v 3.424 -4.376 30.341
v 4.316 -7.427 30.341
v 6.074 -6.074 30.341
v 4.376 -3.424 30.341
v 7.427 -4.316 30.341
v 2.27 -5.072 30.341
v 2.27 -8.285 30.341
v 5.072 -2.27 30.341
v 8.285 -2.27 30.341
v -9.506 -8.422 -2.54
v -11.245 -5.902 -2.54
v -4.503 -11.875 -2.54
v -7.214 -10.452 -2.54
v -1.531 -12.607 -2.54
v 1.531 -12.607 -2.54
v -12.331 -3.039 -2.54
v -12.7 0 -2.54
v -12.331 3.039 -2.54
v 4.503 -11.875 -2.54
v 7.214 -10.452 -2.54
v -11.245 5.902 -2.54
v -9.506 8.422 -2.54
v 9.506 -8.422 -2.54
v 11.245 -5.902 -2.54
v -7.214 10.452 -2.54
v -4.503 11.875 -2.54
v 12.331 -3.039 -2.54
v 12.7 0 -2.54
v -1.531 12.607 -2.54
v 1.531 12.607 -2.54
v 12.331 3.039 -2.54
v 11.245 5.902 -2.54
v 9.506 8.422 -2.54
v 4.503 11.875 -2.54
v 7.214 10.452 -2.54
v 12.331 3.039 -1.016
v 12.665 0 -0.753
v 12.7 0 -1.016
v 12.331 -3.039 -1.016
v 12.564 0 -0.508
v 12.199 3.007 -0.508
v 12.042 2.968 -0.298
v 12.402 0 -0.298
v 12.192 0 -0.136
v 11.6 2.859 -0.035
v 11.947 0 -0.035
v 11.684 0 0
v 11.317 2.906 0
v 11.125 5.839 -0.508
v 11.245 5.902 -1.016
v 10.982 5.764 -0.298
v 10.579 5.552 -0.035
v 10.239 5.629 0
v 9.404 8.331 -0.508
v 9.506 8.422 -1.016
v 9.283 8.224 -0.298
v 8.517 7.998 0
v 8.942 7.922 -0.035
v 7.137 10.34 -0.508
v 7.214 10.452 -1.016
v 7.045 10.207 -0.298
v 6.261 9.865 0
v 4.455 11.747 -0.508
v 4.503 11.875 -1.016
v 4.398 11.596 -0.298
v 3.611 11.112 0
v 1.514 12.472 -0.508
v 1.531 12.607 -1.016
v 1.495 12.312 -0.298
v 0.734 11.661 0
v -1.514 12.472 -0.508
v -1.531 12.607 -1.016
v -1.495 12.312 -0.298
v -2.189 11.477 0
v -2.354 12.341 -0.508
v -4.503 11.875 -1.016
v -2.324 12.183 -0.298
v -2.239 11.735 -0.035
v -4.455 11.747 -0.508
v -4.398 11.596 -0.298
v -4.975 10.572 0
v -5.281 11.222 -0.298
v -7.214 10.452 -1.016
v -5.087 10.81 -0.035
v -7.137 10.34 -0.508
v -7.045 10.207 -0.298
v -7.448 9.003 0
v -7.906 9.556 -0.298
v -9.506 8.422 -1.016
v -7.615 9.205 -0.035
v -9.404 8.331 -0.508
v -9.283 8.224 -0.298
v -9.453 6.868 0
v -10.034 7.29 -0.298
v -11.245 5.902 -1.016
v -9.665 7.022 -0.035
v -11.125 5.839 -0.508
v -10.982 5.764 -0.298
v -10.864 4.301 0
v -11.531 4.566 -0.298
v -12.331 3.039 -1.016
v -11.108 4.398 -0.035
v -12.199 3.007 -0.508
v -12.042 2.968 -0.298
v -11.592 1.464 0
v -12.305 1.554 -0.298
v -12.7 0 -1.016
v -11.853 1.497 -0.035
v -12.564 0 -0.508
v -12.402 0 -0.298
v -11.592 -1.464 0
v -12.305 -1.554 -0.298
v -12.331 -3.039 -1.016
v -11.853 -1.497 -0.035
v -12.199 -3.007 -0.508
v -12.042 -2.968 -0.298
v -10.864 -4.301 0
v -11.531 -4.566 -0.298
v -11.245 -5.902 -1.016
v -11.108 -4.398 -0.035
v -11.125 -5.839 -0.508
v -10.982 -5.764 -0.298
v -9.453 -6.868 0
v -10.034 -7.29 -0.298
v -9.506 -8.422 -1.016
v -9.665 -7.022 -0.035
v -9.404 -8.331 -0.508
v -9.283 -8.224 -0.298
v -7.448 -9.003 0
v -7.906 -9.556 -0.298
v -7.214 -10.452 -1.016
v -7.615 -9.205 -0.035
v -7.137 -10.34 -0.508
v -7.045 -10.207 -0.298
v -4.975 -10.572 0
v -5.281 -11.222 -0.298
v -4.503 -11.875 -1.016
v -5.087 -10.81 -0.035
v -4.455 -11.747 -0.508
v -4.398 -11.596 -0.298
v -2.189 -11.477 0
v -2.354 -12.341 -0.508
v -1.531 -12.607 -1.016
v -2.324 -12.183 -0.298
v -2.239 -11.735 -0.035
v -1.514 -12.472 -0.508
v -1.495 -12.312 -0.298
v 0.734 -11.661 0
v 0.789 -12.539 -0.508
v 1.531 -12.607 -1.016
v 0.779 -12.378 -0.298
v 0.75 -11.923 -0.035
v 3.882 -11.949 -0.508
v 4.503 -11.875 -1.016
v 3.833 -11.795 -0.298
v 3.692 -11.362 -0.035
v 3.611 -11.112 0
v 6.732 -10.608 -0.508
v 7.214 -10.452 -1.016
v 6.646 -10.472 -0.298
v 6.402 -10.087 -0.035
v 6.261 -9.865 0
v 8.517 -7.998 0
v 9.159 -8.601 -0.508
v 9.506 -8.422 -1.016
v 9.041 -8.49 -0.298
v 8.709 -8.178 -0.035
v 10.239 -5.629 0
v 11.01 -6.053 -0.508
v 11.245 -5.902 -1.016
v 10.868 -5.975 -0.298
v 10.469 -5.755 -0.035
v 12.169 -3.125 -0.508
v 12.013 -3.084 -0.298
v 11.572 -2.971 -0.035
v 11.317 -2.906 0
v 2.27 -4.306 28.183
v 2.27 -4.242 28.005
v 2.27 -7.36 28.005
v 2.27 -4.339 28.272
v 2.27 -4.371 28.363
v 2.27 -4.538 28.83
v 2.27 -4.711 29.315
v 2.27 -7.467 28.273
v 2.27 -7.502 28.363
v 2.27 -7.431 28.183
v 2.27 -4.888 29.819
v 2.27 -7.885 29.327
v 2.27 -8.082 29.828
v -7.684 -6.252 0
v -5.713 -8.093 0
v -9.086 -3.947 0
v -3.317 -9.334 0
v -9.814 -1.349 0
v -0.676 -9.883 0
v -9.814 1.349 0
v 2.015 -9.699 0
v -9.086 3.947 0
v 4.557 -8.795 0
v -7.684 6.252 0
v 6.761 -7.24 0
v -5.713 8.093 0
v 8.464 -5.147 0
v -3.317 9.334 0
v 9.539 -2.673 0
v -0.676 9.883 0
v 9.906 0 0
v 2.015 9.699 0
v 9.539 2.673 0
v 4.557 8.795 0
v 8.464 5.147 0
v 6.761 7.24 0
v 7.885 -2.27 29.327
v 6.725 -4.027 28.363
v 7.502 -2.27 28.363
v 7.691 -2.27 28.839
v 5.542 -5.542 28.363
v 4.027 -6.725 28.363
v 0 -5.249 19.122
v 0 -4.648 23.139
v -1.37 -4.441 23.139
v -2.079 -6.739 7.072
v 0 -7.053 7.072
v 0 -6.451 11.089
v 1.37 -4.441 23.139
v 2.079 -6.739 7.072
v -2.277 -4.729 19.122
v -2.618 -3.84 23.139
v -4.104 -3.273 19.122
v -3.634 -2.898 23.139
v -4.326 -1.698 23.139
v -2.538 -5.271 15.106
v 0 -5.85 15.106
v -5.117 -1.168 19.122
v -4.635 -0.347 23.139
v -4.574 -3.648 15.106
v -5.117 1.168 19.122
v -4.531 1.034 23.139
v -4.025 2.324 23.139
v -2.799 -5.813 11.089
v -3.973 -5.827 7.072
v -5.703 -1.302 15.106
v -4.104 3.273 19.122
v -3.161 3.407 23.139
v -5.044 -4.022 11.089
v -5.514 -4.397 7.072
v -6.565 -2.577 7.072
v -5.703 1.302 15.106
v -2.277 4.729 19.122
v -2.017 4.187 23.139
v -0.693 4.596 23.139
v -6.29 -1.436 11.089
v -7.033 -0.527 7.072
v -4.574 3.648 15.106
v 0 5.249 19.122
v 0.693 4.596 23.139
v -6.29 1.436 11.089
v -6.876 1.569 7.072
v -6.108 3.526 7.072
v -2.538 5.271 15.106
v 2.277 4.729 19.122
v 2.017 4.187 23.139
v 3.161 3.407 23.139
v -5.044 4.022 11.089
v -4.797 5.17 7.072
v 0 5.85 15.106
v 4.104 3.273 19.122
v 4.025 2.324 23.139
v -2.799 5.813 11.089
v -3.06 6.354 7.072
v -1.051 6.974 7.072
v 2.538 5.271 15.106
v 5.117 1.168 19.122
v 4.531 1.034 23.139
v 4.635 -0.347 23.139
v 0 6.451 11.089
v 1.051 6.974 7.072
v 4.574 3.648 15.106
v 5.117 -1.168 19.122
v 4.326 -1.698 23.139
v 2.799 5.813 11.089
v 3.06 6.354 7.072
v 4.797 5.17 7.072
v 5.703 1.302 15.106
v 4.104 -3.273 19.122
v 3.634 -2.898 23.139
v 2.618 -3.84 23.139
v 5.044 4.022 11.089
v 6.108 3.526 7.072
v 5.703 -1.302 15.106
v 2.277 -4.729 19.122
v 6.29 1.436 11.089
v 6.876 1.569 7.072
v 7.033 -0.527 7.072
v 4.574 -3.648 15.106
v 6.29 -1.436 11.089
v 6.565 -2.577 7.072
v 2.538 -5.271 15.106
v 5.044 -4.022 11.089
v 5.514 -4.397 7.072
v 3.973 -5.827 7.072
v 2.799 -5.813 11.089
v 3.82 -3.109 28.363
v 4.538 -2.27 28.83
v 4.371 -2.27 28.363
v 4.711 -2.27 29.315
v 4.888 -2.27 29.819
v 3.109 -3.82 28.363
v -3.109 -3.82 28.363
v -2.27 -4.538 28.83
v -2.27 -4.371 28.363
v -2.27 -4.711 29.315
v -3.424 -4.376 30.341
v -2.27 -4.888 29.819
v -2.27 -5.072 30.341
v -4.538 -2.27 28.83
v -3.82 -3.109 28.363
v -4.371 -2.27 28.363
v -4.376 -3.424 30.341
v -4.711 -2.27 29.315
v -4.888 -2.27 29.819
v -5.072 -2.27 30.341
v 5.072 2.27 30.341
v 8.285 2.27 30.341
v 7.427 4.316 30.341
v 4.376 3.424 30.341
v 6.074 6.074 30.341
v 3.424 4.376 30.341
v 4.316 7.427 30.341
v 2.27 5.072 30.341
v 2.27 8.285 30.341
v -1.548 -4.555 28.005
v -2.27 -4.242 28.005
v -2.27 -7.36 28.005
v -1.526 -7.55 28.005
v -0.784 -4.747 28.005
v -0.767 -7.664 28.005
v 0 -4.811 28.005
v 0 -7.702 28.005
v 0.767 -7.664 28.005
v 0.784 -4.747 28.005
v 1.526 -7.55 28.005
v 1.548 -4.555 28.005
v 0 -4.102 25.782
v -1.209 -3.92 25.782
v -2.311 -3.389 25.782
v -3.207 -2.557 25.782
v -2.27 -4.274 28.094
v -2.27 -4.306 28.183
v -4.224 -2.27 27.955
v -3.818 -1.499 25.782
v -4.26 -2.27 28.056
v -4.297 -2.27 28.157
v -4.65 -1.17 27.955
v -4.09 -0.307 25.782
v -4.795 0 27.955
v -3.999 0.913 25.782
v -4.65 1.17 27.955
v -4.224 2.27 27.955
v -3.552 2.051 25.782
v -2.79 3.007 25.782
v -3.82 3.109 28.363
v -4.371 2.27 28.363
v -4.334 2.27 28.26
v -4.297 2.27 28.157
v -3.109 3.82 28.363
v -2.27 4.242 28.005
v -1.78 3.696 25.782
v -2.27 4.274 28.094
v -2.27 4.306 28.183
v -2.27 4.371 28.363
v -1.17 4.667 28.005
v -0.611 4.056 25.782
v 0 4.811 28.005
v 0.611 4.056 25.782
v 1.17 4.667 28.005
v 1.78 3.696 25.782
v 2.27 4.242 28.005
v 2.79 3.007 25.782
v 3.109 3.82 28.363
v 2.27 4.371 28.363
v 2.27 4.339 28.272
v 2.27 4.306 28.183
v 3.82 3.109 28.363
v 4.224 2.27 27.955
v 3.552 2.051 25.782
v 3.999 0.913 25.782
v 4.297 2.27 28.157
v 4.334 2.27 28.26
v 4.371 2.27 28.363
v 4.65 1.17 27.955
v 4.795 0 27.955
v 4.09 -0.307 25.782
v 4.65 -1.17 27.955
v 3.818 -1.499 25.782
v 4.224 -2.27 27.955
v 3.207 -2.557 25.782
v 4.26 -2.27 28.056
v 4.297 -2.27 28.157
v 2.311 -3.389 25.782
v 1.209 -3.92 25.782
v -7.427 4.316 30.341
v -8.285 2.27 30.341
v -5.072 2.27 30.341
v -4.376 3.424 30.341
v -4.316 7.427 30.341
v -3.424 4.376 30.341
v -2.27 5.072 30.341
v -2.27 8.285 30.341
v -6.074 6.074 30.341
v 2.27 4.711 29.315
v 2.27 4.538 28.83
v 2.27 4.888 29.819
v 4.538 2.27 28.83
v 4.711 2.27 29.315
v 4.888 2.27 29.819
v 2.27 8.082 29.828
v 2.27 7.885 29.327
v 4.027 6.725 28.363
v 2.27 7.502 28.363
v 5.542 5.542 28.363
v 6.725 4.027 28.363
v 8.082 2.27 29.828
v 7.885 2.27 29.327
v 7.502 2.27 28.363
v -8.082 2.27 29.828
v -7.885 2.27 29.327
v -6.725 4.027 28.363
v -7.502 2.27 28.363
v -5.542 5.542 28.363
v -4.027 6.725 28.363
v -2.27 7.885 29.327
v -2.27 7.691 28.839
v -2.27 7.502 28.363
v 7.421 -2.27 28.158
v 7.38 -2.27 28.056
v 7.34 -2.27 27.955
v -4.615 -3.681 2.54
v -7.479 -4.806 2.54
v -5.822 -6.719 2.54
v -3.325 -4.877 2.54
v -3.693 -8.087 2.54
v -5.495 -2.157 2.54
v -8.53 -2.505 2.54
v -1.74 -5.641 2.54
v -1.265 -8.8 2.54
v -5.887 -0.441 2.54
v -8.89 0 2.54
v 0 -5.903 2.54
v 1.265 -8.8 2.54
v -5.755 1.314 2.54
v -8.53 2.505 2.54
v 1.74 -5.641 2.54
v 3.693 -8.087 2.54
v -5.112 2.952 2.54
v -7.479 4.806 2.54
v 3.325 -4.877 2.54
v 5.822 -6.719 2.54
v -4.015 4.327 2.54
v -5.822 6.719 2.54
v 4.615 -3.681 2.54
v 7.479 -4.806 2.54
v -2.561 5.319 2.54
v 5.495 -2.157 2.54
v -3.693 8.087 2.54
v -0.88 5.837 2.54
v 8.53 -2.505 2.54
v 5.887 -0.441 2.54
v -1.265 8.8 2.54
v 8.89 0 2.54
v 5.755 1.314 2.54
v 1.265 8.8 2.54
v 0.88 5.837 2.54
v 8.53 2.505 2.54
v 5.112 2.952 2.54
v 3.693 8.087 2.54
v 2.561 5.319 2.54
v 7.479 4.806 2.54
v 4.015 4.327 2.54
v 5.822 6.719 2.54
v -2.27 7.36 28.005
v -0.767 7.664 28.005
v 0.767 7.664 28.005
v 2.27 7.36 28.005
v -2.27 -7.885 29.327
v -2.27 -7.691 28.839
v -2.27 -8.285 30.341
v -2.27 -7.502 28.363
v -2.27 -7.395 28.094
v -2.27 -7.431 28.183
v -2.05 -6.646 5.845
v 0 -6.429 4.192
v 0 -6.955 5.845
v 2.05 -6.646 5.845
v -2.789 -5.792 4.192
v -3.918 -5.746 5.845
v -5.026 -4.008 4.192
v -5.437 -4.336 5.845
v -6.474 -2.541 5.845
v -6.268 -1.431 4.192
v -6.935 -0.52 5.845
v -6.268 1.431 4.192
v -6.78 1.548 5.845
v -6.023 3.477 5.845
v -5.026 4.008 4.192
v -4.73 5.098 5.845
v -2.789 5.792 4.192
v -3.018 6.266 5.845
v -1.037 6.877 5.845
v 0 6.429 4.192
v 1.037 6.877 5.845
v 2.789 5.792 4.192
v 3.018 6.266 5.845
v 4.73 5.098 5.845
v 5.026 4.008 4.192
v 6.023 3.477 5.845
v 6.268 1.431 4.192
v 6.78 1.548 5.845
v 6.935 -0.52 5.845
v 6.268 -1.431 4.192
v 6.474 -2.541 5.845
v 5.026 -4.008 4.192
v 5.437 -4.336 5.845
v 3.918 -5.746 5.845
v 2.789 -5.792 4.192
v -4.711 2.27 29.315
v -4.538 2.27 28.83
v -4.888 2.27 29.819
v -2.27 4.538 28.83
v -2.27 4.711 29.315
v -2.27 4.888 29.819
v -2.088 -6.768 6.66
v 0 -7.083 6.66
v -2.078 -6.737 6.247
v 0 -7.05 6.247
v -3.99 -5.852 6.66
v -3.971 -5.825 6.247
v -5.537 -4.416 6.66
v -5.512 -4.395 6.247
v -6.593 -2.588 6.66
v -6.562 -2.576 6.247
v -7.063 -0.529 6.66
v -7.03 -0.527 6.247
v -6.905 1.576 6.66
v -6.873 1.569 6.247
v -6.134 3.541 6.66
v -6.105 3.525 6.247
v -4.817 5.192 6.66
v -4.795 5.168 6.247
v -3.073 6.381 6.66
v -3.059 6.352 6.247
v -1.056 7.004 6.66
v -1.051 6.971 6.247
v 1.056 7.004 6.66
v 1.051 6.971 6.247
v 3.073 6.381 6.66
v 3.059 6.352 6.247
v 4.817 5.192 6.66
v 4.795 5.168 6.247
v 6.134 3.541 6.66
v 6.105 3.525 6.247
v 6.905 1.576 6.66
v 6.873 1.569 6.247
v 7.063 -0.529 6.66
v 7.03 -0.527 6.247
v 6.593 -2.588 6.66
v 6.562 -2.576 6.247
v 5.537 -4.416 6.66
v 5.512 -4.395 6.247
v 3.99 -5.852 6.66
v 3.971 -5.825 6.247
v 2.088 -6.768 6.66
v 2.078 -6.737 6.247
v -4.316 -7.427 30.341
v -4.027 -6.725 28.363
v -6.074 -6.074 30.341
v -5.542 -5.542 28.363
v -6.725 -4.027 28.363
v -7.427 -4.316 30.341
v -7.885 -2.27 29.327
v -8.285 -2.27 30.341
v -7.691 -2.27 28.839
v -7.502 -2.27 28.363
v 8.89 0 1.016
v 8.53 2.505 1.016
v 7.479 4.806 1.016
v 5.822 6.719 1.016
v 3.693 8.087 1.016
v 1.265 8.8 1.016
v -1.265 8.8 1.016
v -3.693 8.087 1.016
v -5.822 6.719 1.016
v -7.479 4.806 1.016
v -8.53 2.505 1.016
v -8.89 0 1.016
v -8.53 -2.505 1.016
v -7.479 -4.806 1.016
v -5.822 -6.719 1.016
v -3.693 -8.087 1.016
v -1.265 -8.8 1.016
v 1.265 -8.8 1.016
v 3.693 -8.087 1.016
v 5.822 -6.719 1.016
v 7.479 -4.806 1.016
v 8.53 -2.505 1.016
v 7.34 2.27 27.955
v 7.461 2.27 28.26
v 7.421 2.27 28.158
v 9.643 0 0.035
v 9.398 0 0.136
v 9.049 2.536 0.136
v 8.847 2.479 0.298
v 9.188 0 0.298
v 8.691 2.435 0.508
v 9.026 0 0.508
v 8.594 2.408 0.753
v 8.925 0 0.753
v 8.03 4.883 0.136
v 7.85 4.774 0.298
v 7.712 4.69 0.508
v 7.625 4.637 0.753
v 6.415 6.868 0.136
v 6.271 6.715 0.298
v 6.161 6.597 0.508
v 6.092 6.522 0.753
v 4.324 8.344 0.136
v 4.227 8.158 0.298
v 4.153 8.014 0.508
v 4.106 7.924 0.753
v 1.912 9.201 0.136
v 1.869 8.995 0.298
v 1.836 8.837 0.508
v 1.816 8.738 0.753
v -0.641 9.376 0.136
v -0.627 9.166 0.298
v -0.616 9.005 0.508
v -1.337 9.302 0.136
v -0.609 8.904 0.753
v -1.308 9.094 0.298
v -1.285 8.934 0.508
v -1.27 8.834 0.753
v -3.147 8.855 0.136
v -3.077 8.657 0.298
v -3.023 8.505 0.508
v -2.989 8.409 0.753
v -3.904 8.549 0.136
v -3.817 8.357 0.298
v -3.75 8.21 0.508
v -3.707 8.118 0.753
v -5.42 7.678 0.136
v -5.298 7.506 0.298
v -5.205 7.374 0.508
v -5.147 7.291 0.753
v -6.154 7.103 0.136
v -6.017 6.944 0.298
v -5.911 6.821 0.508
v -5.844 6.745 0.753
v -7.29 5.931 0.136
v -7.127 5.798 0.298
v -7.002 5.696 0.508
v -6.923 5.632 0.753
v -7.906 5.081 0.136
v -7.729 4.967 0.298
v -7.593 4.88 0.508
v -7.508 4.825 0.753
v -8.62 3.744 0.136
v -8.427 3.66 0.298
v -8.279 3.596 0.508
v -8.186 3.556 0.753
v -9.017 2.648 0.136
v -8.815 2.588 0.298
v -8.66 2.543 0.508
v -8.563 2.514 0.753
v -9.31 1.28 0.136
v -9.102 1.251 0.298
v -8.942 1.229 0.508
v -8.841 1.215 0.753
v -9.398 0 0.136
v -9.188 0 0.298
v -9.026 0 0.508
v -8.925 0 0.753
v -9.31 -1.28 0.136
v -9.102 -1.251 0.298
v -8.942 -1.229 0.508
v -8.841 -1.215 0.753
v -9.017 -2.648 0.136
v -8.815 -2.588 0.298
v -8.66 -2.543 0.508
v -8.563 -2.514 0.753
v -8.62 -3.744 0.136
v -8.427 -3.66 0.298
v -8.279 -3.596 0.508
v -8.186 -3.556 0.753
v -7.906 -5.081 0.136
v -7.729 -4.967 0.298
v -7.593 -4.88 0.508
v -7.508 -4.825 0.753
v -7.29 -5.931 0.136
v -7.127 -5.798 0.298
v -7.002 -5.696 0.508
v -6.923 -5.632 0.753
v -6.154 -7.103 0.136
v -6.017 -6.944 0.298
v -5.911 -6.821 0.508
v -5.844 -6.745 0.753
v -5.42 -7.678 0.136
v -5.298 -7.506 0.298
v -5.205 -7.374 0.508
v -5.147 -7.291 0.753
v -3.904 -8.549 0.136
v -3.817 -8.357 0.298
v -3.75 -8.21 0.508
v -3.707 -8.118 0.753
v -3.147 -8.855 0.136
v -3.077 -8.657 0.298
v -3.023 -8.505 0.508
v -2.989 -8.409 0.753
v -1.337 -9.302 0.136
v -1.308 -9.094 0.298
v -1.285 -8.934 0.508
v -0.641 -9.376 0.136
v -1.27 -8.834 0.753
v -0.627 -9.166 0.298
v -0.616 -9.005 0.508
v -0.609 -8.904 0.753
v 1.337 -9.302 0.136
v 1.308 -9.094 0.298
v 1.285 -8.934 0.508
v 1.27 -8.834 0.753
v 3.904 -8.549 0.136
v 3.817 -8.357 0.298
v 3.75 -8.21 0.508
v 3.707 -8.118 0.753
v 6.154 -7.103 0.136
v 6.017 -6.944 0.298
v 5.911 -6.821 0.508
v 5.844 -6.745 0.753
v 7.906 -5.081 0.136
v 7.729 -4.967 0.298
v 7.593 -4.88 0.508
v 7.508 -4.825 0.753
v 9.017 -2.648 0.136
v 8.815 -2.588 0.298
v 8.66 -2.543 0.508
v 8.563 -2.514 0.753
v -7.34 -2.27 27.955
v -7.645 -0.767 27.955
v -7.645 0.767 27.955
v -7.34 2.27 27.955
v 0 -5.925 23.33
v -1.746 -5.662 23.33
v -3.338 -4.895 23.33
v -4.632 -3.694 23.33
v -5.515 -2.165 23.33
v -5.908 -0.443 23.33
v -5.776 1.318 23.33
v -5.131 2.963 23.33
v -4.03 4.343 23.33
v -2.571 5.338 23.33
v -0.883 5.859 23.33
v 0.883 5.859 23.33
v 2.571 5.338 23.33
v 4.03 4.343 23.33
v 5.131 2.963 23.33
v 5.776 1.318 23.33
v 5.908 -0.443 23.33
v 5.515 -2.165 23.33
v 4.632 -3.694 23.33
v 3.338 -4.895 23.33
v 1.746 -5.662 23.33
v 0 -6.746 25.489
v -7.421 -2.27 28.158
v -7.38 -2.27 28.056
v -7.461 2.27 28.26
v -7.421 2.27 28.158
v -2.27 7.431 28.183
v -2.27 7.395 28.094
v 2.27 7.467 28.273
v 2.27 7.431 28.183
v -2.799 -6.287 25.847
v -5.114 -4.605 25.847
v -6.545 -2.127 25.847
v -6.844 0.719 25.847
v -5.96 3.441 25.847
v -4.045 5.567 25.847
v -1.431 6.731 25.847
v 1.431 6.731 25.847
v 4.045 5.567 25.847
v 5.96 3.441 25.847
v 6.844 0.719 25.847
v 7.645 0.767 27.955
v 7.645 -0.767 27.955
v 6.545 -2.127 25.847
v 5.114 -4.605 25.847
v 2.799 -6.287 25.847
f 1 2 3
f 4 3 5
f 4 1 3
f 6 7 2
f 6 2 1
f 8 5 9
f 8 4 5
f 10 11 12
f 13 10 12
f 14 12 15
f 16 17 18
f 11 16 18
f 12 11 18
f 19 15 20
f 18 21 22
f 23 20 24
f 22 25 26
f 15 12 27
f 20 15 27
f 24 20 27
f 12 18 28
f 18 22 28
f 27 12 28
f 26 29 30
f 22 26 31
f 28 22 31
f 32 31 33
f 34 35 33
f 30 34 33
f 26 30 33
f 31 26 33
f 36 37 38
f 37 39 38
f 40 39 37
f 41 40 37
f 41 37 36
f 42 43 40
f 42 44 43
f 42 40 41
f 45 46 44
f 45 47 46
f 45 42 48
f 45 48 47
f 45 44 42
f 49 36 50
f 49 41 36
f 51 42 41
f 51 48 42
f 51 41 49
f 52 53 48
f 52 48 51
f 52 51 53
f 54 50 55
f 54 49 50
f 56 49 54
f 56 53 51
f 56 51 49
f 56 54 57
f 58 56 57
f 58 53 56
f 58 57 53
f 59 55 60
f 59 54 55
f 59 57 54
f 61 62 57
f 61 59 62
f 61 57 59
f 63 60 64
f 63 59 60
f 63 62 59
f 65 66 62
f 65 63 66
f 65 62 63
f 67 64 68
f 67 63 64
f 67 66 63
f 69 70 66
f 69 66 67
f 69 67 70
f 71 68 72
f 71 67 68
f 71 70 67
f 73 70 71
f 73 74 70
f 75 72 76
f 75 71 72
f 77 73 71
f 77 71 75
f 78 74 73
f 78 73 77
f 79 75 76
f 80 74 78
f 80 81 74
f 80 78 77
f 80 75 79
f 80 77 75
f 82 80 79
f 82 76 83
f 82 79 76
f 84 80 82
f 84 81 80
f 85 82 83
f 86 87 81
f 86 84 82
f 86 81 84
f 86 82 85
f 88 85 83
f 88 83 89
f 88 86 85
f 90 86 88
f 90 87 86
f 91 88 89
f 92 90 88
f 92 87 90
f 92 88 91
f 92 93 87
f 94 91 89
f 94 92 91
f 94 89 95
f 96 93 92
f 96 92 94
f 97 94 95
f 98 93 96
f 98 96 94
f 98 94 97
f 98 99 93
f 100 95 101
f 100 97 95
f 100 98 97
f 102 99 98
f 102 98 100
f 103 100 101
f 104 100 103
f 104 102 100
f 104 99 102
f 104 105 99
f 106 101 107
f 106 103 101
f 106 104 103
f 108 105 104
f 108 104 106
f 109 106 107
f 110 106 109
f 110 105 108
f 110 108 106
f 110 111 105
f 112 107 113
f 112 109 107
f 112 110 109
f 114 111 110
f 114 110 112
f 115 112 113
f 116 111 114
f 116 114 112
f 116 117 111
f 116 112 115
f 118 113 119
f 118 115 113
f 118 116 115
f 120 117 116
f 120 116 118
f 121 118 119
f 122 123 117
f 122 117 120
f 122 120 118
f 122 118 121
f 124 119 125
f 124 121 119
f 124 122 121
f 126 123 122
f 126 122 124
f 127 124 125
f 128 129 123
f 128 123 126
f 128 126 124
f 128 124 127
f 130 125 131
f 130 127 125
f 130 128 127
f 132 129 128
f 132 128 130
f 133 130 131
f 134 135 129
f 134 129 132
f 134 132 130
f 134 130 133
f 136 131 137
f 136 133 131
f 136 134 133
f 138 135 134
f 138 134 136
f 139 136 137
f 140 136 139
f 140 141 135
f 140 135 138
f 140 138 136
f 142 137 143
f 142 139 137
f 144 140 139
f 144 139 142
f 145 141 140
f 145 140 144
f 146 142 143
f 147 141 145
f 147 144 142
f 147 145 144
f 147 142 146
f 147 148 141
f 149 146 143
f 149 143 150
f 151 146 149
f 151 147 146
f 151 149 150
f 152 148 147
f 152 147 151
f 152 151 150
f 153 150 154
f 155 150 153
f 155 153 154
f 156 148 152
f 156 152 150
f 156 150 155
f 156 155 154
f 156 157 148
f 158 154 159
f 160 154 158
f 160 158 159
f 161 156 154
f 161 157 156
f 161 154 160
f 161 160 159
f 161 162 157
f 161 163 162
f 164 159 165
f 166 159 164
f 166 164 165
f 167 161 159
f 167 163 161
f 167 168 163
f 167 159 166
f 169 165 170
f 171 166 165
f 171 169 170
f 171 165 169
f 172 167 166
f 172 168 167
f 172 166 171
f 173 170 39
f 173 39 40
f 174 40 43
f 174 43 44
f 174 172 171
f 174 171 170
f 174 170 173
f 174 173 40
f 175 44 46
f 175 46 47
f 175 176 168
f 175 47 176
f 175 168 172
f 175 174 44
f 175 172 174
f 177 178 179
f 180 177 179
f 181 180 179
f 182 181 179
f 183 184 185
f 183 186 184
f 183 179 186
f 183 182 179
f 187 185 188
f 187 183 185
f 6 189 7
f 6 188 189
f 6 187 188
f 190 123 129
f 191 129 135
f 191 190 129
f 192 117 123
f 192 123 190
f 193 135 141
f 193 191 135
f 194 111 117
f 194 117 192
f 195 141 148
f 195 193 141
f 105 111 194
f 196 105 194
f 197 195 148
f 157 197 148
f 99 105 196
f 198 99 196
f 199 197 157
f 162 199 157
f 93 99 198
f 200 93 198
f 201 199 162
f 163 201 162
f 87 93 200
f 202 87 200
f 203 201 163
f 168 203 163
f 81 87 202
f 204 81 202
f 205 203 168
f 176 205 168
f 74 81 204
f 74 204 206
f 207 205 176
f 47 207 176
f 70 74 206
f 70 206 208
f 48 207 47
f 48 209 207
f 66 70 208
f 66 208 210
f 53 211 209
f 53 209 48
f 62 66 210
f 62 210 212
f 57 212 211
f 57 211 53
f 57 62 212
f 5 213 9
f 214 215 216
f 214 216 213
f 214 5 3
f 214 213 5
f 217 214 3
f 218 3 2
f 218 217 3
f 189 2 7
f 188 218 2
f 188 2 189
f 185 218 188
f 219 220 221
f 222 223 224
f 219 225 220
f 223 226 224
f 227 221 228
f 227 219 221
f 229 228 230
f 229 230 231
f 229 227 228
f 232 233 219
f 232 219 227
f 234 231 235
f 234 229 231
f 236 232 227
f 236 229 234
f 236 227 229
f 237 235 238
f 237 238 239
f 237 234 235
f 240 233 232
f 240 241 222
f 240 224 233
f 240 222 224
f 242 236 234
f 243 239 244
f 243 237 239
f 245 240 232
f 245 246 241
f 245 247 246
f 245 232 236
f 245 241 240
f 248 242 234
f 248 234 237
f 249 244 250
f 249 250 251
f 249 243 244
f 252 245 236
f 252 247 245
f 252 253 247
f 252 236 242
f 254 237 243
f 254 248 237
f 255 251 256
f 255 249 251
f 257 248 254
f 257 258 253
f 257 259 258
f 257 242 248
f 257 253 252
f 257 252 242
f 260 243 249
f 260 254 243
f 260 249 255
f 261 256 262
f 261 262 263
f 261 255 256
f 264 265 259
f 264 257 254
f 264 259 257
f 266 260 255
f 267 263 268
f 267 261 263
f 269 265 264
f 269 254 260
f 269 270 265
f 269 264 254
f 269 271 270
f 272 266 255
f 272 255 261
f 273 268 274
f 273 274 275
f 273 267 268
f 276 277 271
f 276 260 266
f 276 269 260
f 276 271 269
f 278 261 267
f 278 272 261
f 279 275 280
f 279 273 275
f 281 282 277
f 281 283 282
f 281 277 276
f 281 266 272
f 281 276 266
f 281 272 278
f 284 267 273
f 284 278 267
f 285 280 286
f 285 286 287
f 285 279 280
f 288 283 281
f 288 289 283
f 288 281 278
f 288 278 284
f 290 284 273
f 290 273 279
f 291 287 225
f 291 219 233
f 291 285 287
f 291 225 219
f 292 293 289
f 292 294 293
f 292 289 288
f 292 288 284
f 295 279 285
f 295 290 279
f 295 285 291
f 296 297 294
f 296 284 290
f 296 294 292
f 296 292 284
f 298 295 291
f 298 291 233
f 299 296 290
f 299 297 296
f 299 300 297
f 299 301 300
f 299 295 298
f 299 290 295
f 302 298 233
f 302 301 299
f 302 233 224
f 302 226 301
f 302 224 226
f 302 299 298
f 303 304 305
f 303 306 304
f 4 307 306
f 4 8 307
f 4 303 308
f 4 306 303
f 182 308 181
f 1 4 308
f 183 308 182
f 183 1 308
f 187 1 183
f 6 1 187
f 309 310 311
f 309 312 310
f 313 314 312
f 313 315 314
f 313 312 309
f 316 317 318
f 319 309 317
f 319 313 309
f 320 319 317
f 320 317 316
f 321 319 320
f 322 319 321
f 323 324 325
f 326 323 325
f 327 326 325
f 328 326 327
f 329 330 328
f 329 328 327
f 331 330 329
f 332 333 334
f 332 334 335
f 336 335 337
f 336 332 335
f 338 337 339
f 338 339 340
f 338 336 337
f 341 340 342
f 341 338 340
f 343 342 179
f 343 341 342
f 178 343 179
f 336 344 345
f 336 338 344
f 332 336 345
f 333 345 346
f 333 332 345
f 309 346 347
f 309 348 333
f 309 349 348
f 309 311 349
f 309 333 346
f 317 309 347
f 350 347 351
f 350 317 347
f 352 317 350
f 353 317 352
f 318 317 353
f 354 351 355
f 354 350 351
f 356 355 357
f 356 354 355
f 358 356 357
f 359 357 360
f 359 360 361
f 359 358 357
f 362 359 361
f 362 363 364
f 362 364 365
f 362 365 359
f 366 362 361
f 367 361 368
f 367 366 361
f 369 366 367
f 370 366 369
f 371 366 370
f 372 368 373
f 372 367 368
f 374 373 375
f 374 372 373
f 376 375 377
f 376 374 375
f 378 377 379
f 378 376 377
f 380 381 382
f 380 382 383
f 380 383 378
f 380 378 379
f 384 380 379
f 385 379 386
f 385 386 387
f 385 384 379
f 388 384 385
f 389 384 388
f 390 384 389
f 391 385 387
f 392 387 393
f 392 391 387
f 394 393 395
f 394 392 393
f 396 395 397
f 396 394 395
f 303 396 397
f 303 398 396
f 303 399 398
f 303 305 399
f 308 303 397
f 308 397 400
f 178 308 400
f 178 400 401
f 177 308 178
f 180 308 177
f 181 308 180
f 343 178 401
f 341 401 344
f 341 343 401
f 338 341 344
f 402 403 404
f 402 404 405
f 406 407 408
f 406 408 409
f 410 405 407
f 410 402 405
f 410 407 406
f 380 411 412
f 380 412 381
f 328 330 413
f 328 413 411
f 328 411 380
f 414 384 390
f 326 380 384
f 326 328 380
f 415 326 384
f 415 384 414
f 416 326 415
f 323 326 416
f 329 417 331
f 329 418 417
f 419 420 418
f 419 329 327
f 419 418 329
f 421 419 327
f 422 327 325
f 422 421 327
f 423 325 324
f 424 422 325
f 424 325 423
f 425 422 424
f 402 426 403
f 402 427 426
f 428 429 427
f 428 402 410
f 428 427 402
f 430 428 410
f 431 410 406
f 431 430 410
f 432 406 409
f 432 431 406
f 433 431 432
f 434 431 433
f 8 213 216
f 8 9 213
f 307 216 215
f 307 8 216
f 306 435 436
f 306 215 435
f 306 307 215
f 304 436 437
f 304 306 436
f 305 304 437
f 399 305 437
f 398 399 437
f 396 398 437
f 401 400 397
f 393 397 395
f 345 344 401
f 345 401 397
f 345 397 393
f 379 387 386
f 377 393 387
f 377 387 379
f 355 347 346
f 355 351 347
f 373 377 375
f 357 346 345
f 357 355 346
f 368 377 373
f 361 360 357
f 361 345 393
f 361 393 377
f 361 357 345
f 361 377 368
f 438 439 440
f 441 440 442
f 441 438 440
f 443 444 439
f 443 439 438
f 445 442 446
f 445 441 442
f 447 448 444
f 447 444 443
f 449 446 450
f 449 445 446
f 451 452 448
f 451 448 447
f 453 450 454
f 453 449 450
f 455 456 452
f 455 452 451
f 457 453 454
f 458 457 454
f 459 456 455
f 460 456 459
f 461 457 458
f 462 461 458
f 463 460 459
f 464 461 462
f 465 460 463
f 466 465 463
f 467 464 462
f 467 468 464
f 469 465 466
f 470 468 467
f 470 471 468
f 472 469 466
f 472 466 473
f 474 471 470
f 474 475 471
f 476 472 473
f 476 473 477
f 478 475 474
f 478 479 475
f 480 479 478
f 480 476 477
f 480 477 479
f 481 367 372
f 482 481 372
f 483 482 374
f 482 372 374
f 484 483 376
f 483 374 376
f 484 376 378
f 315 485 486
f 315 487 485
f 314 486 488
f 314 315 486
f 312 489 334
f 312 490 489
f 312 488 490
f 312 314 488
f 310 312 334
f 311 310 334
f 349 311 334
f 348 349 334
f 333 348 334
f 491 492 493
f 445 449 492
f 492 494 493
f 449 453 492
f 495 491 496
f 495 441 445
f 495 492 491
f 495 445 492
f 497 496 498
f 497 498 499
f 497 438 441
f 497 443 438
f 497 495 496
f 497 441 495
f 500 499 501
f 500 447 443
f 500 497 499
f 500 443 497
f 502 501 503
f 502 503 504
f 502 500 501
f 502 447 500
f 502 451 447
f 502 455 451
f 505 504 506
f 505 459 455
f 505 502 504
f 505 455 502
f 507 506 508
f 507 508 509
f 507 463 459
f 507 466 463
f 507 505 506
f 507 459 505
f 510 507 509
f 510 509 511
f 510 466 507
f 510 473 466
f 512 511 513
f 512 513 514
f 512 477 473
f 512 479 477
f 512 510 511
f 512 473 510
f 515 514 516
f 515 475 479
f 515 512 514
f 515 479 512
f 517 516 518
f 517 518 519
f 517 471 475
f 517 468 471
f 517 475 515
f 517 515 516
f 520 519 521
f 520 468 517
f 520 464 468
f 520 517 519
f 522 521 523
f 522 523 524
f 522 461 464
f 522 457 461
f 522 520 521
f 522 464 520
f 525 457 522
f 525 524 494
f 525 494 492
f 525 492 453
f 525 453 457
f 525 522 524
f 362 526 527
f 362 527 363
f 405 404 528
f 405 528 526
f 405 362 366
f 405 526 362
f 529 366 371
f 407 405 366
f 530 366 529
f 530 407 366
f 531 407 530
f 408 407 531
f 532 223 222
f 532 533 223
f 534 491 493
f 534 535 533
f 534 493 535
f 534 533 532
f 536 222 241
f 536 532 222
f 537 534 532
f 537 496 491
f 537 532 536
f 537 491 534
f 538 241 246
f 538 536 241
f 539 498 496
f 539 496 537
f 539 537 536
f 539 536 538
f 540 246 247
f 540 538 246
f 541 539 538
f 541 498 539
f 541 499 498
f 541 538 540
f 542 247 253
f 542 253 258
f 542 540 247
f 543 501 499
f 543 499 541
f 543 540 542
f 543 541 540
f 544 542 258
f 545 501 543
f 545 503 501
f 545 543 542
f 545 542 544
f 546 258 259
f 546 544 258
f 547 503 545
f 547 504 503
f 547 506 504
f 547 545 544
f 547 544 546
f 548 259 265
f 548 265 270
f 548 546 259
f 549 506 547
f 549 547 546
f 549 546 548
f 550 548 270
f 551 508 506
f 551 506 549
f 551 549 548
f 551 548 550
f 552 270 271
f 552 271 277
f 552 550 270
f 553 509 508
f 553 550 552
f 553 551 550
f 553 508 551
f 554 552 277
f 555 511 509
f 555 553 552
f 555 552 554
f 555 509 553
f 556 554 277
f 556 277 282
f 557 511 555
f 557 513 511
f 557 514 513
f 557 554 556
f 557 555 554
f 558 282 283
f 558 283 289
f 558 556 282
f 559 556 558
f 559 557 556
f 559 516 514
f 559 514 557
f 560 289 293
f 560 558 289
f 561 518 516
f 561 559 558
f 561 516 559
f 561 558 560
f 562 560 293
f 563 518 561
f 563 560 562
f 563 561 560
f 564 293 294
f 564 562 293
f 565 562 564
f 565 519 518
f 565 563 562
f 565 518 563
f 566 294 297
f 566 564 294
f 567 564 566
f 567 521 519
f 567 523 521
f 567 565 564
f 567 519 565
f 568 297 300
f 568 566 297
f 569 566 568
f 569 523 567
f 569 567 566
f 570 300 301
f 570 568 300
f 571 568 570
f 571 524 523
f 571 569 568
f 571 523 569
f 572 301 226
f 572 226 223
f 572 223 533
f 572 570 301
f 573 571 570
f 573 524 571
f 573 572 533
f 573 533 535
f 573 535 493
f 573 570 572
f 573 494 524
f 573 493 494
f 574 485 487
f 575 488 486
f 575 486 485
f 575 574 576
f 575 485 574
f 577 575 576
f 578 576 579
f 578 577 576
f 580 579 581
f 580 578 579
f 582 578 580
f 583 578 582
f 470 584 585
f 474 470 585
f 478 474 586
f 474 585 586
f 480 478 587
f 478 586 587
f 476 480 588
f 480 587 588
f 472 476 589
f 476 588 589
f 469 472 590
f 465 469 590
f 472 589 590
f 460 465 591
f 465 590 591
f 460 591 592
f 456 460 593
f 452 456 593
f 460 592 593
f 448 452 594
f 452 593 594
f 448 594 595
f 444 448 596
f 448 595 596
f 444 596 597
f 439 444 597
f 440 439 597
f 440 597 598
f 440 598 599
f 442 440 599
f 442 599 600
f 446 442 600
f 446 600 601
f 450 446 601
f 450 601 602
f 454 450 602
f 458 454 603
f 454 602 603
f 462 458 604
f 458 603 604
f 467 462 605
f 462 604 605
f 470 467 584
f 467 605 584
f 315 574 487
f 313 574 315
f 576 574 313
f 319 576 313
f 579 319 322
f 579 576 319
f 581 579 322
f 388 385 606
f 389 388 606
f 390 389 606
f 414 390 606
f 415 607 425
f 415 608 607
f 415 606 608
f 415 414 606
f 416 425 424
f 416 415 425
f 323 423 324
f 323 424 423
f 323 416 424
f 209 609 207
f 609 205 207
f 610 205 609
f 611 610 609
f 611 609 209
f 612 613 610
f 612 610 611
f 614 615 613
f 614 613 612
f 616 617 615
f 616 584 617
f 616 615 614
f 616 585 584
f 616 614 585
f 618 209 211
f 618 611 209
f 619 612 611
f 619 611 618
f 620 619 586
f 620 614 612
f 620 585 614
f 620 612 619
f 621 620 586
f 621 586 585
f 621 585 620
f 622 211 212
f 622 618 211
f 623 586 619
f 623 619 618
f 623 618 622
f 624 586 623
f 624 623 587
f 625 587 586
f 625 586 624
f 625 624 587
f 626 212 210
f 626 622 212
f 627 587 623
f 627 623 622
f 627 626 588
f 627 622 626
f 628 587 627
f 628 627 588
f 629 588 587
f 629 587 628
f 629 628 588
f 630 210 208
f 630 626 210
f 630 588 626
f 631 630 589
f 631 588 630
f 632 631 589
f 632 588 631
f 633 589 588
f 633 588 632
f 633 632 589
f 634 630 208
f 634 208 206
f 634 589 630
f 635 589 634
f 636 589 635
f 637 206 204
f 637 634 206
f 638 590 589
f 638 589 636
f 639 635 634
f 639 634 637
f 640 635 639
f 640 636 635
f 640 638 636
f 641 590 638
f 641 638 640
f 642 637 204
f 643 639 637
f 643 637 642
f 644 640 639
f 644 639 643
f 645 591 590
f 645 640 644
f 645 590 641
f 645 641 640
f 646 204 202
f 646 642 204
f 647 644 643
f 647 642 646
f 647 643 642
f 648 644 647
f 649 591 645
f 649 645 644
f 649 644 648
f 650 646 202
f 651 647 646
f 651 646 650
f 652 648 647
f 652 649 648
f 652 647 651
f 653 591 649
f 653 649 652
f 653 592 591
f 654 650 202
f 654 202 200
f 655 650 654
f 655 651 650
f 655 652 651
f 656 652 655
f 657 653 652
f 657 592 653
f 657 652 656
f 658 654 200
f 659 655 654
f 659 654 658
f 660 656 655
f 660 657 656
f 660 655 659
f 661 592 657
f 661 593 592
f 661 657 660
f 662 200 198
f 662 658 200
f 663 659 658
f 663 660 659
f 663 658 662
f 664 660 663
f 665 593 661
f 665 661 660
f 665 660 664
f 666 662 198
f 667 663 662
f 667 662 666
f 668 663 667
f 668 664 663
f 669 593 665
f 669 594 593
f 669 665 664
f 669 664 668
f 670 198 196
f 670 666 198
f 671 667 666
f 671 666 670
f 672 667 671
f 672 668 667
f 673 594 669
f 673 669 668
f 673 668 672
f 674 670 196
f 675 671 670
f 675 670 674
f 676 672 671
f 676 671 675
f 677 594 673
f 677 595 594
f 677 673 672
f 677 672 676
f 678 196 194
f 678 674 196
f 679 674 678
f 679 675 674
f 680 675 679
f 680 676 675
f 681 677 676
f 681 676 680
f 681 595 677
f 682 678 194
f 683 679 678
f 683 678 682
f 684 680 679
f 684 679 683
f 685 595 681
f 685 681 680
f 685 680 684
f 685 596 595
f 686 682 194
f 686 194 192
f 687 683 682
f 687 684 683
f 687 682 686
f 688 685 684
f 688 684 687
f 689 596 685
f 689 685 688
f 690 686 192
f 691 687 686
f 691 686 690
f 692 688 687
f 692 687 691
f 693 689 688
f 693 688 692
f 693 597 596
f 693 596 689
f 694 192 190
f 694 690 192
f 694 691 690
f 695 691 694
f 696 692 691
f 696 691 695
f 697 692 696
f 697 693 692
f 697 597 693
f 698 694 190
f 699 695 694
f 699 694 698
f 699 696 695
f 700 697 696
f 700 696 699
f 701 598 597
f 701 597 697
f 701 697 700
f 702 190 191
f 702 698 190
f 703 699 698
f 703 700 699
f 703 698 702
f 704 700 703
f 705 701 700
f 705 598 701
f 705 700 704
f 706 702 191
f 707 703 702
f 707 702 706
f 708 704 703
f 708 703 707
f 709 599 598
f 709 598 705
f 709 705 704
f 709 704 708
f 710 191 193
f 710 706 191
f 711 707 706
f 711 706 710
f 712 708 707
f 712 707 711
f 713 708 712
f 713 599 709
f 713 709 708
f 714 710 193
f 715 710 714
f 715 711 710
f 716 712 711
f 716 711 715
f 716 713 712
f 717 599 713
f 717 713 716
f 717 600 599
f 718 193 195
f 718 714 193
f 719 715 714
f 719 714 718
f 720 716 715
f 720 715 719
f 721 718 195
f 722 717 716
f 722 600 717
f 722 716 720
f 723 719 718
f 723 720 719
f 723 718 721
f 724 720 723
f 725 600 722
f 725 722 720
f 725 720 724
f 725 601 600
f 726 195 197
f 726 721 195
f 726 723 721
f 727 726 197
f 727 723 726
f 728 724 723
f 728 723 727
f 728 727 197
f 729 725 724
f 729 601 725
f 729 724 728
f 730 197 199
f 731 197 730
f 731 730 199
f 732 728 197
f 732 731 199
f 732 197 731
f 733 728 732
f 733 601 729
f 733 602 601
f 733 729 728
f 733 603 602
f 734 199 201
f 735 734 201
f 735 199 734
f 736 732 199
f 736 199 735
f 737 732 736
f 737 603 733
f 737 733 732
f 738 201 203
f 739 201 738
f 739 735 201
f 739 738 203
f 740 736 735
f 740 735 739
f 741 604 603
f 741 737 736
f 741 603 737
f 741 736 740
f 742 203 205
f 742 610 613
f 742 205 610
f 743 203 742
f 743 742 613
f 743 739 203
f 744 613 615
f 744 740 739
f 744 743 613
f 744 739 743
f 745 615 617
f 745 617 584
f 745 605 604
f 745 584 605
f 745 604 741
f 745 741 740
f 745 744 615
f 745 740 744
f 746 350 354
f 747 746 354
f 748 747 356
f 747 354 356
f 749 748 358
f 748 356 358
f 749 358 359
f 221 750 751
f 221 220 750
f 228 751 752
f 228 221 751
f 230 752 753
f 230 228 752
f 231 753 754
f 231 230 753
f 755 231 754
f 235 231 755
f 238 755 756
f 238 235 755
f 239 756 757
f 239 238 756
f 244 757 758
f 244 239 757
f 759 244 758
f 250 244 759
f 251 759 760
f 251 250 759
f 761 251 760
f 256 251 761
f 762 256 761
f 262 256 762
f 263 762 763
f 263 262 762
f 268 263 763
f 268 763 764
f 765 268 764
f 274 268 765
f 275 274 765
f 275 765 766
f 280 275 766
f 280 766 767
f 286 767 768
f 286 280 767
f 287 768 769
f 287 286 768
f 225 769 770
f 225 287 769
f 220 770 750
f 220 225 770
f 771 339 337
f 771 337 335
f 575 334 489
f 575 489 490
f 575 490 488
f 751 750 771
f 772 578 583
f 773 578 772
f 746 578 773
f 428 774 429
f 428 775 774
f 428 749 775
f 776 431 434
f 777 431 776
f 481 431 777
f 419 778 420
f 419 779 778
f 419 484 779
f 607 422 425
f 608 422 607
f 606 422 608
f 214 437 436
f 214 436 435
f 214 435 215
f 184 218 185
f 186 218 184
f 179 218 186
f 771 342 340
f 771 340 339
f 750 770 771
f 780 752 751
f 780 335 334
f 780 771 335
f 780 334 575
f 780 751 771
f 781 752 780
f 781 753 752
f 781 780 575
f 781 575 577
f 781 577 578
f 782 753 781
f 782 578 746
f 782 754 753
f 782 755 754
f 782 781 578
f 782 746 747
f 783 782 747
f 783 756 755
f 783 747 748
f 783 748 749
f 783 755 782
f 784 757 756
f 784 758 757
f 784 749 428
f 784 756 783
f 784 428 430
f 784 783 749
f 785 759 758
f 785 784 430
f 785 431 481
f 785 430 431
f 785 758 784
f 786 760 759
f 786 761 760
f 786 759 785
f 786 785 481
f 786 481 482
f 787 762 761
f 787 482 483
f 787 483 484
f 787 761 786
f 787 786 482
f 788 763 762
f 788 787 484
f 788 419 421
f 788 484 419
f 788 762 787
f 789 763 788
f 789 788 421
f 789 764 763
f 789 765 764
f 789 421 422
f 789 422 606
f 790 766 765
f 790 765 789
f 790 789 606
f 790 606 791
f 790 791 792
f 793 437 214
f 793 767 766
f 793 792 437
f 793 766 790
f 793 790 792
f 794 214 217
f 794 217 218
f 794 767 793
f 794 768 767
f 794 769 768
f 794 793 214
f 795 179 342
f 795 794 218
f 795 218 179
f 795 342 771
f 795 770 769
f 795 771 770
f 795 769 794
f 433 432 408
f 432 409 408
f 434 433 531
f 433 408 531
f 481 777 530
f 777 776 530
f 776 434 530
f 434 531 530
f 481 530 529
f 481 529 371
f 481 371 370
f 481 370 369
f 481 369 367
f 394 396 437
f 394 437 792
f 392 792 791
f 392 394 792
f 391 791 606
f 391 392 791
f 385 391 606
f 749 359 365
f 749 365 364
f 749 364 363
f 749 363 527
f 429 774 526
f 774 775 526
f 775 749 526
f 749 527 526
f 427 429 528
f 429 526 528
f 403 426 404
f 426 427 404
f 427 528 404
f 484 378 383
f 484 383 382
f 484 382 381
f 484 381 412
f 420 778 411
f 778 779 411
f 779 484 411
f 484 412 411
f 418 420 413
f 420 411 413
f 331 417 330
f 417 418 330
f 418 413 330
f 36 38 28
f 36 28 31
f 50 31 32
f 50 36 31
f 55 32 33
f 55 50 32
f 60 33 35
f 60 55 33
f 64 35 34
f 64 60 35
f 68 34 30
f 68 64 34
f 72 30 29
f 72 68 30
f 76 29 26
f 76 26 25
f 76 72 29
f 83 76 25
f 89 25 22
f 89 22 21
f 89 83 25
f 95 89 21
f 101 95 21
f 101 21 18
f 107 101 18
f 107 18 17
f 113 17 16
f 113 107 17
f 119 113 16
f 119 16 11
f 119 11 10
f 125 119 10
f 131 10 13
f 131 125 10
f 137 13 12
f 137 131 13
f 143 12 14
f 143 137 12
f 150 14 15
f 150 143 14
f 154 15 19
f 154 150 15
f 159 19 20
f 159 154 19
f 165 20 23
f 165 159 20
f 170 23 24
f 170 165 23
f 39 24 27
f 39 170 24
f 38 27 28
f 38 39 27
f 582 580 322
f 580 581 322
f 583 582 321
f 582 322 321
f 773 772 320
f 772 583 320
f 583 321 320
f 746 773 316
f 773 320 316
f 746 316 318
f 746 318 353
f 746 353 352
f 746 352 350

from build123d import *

# Parameters (mm, degrees)
F0_R          = 12.7
F0_R_2        = 8.89
F0_R_3        = 6.35
F0_R_4        = 3.81
F1_DEPTH      = 2.54
F2_DEPTH      = 2.54
F3_R          = 1.016
F7_DEPTH      = 25.4
F7_DEPTH_BACK = 25.4
F9_DEPTH      = 25.4
F9_DEPTH_BACK = 25.4


with BuildPart() as f1:
    # F0 (on Top) → F1 (new body)
    with BuildSketch(Plane.XY):
        Circle(F0_R)
        Circle(F0_R_2, mode=Mode.SUBTRACT)
        Circle(F0_R_2)
        Circle(F0_R_3, mode=Mode.SUBTRACT)
        Circle(F0_R_3)
        Circle(F0_R_4, mode=Mode.SUBTRACT)
        Circle(F0_R_4)
    extrude(amount=-F1_DEPTH)

    # F0 (on Top) → F2 (join)
    with BuildSketch(Plane.XY):
        Circle(F0_R_2)
        Circle(F0_R_3, mode=Mode.SUBTRACT)
        Circle(F0_R_3)
        Circle(F0_R_4, mode=Mode.SUBTRACT)
        Circle(F0_R_4)
    extrude(amount=F2_DEPTH)

    # F3
    f3_edges = [f1.edges().sort_by_distance(p)[0] for p in [
        (-8.89, 0, 0),
        (-12.7, 0, 0),
    ]]
    fillet(f3_edges, radius=F3_R)

    # F4 (on Right) → F5 (revolve)
    with BuildSketch(Plane.YZ):
        with BuildLine():
            ThreePointArc((-7.052727852, 7.0721389887), (-7.0740632783, 6.4527327622), (-6.95464605, 5.8445725864))
            Line((-6.95464605, 5.8445725864), (-5.8483541943, 2.3676548153))
            Line((-5.8483541943, 2.3676548153), (0, 2.3676548153))
            Line((0, 2.3676548153), (0, 21.9140928239))
            Line((0, 21.9140928239), (0, 23.5729362753))
            Line((0, 23.5729362753), (0, 24.7111208737))
            Line((0, 24.7111208737), (0, 24.8141754419))
            Line((0, 24.8141754419), (0, 25.781949982))
            Line((0, 25.781949982), (-4.1019017808, 25.781949982))
            Line((-4.1019017808, 25.781949982), (-4.9252421595, 28.3628571779))
            Line((-4.9252421595, 28.3628571779), (-5.5563063145, 30.341040273))
            Line((-5.5563063145, 30.341040273), (-5.6435932728, 30.341040273))
            Line((-5.6435932728, 30.341040273), (-8.5902156056, 30.341040273))
            Line((-8.5902156056, 30.341040273), (-7.8381793573, 28.3628571779))
            Line((-7.8381793573, 28.3628571779), (-5.9250046527, 23.33037388))
            Line((-5.9250046527, 23.33037388), (-4.647559738, 23.1391453645))
            Line((-4.647559738, 23.1391453645), (-7.052727852, 7.0721389887))
        make_face()
    revolve(axis=Axis((0, 0, 13.5393878445), (0, 0, -1)))

    # F6 (on Front) → F7 (cut, two sides)
    with BuildSketch(Plane.XZ) as f7_sk:
        Polygon((-2.2698096, 28.0051901937), (0, 28.0051901937), (2.2698096, 28.0051901937), (2.2698096, 30.4731242359), (0, 30.4731242359), (-2.2698096, 30.4731242359), align=None)
    extrude(amount=-F7_DEPTH, mode=Mode.SUBTRACT)
    extrude(f7_sk.sketch, amount=F7_DEPTH_BACK, mode=Mode.SUBTRACT)

    # F8 (on Right) → F9 (cut, two sides)
    with BuildSketch(Plane.YZ) as f9_sk:
        Polygon((-2.2698075, 27.955027986), (0, 27.955027986), (2.2698075, 27.955027986), (2.2698075, 31.4495795649), (0, 31.4495795649), (-2.2698075, 31.4495795649), align=None)
    extrude(amount=-F9_DEPTH, mode=Mode.SUBTRACT)
    extrude(f9_sk.sketch, amount=F9_DEPTH_BACK, mode=Mode.SUBTRACT)


solid = f1.part
